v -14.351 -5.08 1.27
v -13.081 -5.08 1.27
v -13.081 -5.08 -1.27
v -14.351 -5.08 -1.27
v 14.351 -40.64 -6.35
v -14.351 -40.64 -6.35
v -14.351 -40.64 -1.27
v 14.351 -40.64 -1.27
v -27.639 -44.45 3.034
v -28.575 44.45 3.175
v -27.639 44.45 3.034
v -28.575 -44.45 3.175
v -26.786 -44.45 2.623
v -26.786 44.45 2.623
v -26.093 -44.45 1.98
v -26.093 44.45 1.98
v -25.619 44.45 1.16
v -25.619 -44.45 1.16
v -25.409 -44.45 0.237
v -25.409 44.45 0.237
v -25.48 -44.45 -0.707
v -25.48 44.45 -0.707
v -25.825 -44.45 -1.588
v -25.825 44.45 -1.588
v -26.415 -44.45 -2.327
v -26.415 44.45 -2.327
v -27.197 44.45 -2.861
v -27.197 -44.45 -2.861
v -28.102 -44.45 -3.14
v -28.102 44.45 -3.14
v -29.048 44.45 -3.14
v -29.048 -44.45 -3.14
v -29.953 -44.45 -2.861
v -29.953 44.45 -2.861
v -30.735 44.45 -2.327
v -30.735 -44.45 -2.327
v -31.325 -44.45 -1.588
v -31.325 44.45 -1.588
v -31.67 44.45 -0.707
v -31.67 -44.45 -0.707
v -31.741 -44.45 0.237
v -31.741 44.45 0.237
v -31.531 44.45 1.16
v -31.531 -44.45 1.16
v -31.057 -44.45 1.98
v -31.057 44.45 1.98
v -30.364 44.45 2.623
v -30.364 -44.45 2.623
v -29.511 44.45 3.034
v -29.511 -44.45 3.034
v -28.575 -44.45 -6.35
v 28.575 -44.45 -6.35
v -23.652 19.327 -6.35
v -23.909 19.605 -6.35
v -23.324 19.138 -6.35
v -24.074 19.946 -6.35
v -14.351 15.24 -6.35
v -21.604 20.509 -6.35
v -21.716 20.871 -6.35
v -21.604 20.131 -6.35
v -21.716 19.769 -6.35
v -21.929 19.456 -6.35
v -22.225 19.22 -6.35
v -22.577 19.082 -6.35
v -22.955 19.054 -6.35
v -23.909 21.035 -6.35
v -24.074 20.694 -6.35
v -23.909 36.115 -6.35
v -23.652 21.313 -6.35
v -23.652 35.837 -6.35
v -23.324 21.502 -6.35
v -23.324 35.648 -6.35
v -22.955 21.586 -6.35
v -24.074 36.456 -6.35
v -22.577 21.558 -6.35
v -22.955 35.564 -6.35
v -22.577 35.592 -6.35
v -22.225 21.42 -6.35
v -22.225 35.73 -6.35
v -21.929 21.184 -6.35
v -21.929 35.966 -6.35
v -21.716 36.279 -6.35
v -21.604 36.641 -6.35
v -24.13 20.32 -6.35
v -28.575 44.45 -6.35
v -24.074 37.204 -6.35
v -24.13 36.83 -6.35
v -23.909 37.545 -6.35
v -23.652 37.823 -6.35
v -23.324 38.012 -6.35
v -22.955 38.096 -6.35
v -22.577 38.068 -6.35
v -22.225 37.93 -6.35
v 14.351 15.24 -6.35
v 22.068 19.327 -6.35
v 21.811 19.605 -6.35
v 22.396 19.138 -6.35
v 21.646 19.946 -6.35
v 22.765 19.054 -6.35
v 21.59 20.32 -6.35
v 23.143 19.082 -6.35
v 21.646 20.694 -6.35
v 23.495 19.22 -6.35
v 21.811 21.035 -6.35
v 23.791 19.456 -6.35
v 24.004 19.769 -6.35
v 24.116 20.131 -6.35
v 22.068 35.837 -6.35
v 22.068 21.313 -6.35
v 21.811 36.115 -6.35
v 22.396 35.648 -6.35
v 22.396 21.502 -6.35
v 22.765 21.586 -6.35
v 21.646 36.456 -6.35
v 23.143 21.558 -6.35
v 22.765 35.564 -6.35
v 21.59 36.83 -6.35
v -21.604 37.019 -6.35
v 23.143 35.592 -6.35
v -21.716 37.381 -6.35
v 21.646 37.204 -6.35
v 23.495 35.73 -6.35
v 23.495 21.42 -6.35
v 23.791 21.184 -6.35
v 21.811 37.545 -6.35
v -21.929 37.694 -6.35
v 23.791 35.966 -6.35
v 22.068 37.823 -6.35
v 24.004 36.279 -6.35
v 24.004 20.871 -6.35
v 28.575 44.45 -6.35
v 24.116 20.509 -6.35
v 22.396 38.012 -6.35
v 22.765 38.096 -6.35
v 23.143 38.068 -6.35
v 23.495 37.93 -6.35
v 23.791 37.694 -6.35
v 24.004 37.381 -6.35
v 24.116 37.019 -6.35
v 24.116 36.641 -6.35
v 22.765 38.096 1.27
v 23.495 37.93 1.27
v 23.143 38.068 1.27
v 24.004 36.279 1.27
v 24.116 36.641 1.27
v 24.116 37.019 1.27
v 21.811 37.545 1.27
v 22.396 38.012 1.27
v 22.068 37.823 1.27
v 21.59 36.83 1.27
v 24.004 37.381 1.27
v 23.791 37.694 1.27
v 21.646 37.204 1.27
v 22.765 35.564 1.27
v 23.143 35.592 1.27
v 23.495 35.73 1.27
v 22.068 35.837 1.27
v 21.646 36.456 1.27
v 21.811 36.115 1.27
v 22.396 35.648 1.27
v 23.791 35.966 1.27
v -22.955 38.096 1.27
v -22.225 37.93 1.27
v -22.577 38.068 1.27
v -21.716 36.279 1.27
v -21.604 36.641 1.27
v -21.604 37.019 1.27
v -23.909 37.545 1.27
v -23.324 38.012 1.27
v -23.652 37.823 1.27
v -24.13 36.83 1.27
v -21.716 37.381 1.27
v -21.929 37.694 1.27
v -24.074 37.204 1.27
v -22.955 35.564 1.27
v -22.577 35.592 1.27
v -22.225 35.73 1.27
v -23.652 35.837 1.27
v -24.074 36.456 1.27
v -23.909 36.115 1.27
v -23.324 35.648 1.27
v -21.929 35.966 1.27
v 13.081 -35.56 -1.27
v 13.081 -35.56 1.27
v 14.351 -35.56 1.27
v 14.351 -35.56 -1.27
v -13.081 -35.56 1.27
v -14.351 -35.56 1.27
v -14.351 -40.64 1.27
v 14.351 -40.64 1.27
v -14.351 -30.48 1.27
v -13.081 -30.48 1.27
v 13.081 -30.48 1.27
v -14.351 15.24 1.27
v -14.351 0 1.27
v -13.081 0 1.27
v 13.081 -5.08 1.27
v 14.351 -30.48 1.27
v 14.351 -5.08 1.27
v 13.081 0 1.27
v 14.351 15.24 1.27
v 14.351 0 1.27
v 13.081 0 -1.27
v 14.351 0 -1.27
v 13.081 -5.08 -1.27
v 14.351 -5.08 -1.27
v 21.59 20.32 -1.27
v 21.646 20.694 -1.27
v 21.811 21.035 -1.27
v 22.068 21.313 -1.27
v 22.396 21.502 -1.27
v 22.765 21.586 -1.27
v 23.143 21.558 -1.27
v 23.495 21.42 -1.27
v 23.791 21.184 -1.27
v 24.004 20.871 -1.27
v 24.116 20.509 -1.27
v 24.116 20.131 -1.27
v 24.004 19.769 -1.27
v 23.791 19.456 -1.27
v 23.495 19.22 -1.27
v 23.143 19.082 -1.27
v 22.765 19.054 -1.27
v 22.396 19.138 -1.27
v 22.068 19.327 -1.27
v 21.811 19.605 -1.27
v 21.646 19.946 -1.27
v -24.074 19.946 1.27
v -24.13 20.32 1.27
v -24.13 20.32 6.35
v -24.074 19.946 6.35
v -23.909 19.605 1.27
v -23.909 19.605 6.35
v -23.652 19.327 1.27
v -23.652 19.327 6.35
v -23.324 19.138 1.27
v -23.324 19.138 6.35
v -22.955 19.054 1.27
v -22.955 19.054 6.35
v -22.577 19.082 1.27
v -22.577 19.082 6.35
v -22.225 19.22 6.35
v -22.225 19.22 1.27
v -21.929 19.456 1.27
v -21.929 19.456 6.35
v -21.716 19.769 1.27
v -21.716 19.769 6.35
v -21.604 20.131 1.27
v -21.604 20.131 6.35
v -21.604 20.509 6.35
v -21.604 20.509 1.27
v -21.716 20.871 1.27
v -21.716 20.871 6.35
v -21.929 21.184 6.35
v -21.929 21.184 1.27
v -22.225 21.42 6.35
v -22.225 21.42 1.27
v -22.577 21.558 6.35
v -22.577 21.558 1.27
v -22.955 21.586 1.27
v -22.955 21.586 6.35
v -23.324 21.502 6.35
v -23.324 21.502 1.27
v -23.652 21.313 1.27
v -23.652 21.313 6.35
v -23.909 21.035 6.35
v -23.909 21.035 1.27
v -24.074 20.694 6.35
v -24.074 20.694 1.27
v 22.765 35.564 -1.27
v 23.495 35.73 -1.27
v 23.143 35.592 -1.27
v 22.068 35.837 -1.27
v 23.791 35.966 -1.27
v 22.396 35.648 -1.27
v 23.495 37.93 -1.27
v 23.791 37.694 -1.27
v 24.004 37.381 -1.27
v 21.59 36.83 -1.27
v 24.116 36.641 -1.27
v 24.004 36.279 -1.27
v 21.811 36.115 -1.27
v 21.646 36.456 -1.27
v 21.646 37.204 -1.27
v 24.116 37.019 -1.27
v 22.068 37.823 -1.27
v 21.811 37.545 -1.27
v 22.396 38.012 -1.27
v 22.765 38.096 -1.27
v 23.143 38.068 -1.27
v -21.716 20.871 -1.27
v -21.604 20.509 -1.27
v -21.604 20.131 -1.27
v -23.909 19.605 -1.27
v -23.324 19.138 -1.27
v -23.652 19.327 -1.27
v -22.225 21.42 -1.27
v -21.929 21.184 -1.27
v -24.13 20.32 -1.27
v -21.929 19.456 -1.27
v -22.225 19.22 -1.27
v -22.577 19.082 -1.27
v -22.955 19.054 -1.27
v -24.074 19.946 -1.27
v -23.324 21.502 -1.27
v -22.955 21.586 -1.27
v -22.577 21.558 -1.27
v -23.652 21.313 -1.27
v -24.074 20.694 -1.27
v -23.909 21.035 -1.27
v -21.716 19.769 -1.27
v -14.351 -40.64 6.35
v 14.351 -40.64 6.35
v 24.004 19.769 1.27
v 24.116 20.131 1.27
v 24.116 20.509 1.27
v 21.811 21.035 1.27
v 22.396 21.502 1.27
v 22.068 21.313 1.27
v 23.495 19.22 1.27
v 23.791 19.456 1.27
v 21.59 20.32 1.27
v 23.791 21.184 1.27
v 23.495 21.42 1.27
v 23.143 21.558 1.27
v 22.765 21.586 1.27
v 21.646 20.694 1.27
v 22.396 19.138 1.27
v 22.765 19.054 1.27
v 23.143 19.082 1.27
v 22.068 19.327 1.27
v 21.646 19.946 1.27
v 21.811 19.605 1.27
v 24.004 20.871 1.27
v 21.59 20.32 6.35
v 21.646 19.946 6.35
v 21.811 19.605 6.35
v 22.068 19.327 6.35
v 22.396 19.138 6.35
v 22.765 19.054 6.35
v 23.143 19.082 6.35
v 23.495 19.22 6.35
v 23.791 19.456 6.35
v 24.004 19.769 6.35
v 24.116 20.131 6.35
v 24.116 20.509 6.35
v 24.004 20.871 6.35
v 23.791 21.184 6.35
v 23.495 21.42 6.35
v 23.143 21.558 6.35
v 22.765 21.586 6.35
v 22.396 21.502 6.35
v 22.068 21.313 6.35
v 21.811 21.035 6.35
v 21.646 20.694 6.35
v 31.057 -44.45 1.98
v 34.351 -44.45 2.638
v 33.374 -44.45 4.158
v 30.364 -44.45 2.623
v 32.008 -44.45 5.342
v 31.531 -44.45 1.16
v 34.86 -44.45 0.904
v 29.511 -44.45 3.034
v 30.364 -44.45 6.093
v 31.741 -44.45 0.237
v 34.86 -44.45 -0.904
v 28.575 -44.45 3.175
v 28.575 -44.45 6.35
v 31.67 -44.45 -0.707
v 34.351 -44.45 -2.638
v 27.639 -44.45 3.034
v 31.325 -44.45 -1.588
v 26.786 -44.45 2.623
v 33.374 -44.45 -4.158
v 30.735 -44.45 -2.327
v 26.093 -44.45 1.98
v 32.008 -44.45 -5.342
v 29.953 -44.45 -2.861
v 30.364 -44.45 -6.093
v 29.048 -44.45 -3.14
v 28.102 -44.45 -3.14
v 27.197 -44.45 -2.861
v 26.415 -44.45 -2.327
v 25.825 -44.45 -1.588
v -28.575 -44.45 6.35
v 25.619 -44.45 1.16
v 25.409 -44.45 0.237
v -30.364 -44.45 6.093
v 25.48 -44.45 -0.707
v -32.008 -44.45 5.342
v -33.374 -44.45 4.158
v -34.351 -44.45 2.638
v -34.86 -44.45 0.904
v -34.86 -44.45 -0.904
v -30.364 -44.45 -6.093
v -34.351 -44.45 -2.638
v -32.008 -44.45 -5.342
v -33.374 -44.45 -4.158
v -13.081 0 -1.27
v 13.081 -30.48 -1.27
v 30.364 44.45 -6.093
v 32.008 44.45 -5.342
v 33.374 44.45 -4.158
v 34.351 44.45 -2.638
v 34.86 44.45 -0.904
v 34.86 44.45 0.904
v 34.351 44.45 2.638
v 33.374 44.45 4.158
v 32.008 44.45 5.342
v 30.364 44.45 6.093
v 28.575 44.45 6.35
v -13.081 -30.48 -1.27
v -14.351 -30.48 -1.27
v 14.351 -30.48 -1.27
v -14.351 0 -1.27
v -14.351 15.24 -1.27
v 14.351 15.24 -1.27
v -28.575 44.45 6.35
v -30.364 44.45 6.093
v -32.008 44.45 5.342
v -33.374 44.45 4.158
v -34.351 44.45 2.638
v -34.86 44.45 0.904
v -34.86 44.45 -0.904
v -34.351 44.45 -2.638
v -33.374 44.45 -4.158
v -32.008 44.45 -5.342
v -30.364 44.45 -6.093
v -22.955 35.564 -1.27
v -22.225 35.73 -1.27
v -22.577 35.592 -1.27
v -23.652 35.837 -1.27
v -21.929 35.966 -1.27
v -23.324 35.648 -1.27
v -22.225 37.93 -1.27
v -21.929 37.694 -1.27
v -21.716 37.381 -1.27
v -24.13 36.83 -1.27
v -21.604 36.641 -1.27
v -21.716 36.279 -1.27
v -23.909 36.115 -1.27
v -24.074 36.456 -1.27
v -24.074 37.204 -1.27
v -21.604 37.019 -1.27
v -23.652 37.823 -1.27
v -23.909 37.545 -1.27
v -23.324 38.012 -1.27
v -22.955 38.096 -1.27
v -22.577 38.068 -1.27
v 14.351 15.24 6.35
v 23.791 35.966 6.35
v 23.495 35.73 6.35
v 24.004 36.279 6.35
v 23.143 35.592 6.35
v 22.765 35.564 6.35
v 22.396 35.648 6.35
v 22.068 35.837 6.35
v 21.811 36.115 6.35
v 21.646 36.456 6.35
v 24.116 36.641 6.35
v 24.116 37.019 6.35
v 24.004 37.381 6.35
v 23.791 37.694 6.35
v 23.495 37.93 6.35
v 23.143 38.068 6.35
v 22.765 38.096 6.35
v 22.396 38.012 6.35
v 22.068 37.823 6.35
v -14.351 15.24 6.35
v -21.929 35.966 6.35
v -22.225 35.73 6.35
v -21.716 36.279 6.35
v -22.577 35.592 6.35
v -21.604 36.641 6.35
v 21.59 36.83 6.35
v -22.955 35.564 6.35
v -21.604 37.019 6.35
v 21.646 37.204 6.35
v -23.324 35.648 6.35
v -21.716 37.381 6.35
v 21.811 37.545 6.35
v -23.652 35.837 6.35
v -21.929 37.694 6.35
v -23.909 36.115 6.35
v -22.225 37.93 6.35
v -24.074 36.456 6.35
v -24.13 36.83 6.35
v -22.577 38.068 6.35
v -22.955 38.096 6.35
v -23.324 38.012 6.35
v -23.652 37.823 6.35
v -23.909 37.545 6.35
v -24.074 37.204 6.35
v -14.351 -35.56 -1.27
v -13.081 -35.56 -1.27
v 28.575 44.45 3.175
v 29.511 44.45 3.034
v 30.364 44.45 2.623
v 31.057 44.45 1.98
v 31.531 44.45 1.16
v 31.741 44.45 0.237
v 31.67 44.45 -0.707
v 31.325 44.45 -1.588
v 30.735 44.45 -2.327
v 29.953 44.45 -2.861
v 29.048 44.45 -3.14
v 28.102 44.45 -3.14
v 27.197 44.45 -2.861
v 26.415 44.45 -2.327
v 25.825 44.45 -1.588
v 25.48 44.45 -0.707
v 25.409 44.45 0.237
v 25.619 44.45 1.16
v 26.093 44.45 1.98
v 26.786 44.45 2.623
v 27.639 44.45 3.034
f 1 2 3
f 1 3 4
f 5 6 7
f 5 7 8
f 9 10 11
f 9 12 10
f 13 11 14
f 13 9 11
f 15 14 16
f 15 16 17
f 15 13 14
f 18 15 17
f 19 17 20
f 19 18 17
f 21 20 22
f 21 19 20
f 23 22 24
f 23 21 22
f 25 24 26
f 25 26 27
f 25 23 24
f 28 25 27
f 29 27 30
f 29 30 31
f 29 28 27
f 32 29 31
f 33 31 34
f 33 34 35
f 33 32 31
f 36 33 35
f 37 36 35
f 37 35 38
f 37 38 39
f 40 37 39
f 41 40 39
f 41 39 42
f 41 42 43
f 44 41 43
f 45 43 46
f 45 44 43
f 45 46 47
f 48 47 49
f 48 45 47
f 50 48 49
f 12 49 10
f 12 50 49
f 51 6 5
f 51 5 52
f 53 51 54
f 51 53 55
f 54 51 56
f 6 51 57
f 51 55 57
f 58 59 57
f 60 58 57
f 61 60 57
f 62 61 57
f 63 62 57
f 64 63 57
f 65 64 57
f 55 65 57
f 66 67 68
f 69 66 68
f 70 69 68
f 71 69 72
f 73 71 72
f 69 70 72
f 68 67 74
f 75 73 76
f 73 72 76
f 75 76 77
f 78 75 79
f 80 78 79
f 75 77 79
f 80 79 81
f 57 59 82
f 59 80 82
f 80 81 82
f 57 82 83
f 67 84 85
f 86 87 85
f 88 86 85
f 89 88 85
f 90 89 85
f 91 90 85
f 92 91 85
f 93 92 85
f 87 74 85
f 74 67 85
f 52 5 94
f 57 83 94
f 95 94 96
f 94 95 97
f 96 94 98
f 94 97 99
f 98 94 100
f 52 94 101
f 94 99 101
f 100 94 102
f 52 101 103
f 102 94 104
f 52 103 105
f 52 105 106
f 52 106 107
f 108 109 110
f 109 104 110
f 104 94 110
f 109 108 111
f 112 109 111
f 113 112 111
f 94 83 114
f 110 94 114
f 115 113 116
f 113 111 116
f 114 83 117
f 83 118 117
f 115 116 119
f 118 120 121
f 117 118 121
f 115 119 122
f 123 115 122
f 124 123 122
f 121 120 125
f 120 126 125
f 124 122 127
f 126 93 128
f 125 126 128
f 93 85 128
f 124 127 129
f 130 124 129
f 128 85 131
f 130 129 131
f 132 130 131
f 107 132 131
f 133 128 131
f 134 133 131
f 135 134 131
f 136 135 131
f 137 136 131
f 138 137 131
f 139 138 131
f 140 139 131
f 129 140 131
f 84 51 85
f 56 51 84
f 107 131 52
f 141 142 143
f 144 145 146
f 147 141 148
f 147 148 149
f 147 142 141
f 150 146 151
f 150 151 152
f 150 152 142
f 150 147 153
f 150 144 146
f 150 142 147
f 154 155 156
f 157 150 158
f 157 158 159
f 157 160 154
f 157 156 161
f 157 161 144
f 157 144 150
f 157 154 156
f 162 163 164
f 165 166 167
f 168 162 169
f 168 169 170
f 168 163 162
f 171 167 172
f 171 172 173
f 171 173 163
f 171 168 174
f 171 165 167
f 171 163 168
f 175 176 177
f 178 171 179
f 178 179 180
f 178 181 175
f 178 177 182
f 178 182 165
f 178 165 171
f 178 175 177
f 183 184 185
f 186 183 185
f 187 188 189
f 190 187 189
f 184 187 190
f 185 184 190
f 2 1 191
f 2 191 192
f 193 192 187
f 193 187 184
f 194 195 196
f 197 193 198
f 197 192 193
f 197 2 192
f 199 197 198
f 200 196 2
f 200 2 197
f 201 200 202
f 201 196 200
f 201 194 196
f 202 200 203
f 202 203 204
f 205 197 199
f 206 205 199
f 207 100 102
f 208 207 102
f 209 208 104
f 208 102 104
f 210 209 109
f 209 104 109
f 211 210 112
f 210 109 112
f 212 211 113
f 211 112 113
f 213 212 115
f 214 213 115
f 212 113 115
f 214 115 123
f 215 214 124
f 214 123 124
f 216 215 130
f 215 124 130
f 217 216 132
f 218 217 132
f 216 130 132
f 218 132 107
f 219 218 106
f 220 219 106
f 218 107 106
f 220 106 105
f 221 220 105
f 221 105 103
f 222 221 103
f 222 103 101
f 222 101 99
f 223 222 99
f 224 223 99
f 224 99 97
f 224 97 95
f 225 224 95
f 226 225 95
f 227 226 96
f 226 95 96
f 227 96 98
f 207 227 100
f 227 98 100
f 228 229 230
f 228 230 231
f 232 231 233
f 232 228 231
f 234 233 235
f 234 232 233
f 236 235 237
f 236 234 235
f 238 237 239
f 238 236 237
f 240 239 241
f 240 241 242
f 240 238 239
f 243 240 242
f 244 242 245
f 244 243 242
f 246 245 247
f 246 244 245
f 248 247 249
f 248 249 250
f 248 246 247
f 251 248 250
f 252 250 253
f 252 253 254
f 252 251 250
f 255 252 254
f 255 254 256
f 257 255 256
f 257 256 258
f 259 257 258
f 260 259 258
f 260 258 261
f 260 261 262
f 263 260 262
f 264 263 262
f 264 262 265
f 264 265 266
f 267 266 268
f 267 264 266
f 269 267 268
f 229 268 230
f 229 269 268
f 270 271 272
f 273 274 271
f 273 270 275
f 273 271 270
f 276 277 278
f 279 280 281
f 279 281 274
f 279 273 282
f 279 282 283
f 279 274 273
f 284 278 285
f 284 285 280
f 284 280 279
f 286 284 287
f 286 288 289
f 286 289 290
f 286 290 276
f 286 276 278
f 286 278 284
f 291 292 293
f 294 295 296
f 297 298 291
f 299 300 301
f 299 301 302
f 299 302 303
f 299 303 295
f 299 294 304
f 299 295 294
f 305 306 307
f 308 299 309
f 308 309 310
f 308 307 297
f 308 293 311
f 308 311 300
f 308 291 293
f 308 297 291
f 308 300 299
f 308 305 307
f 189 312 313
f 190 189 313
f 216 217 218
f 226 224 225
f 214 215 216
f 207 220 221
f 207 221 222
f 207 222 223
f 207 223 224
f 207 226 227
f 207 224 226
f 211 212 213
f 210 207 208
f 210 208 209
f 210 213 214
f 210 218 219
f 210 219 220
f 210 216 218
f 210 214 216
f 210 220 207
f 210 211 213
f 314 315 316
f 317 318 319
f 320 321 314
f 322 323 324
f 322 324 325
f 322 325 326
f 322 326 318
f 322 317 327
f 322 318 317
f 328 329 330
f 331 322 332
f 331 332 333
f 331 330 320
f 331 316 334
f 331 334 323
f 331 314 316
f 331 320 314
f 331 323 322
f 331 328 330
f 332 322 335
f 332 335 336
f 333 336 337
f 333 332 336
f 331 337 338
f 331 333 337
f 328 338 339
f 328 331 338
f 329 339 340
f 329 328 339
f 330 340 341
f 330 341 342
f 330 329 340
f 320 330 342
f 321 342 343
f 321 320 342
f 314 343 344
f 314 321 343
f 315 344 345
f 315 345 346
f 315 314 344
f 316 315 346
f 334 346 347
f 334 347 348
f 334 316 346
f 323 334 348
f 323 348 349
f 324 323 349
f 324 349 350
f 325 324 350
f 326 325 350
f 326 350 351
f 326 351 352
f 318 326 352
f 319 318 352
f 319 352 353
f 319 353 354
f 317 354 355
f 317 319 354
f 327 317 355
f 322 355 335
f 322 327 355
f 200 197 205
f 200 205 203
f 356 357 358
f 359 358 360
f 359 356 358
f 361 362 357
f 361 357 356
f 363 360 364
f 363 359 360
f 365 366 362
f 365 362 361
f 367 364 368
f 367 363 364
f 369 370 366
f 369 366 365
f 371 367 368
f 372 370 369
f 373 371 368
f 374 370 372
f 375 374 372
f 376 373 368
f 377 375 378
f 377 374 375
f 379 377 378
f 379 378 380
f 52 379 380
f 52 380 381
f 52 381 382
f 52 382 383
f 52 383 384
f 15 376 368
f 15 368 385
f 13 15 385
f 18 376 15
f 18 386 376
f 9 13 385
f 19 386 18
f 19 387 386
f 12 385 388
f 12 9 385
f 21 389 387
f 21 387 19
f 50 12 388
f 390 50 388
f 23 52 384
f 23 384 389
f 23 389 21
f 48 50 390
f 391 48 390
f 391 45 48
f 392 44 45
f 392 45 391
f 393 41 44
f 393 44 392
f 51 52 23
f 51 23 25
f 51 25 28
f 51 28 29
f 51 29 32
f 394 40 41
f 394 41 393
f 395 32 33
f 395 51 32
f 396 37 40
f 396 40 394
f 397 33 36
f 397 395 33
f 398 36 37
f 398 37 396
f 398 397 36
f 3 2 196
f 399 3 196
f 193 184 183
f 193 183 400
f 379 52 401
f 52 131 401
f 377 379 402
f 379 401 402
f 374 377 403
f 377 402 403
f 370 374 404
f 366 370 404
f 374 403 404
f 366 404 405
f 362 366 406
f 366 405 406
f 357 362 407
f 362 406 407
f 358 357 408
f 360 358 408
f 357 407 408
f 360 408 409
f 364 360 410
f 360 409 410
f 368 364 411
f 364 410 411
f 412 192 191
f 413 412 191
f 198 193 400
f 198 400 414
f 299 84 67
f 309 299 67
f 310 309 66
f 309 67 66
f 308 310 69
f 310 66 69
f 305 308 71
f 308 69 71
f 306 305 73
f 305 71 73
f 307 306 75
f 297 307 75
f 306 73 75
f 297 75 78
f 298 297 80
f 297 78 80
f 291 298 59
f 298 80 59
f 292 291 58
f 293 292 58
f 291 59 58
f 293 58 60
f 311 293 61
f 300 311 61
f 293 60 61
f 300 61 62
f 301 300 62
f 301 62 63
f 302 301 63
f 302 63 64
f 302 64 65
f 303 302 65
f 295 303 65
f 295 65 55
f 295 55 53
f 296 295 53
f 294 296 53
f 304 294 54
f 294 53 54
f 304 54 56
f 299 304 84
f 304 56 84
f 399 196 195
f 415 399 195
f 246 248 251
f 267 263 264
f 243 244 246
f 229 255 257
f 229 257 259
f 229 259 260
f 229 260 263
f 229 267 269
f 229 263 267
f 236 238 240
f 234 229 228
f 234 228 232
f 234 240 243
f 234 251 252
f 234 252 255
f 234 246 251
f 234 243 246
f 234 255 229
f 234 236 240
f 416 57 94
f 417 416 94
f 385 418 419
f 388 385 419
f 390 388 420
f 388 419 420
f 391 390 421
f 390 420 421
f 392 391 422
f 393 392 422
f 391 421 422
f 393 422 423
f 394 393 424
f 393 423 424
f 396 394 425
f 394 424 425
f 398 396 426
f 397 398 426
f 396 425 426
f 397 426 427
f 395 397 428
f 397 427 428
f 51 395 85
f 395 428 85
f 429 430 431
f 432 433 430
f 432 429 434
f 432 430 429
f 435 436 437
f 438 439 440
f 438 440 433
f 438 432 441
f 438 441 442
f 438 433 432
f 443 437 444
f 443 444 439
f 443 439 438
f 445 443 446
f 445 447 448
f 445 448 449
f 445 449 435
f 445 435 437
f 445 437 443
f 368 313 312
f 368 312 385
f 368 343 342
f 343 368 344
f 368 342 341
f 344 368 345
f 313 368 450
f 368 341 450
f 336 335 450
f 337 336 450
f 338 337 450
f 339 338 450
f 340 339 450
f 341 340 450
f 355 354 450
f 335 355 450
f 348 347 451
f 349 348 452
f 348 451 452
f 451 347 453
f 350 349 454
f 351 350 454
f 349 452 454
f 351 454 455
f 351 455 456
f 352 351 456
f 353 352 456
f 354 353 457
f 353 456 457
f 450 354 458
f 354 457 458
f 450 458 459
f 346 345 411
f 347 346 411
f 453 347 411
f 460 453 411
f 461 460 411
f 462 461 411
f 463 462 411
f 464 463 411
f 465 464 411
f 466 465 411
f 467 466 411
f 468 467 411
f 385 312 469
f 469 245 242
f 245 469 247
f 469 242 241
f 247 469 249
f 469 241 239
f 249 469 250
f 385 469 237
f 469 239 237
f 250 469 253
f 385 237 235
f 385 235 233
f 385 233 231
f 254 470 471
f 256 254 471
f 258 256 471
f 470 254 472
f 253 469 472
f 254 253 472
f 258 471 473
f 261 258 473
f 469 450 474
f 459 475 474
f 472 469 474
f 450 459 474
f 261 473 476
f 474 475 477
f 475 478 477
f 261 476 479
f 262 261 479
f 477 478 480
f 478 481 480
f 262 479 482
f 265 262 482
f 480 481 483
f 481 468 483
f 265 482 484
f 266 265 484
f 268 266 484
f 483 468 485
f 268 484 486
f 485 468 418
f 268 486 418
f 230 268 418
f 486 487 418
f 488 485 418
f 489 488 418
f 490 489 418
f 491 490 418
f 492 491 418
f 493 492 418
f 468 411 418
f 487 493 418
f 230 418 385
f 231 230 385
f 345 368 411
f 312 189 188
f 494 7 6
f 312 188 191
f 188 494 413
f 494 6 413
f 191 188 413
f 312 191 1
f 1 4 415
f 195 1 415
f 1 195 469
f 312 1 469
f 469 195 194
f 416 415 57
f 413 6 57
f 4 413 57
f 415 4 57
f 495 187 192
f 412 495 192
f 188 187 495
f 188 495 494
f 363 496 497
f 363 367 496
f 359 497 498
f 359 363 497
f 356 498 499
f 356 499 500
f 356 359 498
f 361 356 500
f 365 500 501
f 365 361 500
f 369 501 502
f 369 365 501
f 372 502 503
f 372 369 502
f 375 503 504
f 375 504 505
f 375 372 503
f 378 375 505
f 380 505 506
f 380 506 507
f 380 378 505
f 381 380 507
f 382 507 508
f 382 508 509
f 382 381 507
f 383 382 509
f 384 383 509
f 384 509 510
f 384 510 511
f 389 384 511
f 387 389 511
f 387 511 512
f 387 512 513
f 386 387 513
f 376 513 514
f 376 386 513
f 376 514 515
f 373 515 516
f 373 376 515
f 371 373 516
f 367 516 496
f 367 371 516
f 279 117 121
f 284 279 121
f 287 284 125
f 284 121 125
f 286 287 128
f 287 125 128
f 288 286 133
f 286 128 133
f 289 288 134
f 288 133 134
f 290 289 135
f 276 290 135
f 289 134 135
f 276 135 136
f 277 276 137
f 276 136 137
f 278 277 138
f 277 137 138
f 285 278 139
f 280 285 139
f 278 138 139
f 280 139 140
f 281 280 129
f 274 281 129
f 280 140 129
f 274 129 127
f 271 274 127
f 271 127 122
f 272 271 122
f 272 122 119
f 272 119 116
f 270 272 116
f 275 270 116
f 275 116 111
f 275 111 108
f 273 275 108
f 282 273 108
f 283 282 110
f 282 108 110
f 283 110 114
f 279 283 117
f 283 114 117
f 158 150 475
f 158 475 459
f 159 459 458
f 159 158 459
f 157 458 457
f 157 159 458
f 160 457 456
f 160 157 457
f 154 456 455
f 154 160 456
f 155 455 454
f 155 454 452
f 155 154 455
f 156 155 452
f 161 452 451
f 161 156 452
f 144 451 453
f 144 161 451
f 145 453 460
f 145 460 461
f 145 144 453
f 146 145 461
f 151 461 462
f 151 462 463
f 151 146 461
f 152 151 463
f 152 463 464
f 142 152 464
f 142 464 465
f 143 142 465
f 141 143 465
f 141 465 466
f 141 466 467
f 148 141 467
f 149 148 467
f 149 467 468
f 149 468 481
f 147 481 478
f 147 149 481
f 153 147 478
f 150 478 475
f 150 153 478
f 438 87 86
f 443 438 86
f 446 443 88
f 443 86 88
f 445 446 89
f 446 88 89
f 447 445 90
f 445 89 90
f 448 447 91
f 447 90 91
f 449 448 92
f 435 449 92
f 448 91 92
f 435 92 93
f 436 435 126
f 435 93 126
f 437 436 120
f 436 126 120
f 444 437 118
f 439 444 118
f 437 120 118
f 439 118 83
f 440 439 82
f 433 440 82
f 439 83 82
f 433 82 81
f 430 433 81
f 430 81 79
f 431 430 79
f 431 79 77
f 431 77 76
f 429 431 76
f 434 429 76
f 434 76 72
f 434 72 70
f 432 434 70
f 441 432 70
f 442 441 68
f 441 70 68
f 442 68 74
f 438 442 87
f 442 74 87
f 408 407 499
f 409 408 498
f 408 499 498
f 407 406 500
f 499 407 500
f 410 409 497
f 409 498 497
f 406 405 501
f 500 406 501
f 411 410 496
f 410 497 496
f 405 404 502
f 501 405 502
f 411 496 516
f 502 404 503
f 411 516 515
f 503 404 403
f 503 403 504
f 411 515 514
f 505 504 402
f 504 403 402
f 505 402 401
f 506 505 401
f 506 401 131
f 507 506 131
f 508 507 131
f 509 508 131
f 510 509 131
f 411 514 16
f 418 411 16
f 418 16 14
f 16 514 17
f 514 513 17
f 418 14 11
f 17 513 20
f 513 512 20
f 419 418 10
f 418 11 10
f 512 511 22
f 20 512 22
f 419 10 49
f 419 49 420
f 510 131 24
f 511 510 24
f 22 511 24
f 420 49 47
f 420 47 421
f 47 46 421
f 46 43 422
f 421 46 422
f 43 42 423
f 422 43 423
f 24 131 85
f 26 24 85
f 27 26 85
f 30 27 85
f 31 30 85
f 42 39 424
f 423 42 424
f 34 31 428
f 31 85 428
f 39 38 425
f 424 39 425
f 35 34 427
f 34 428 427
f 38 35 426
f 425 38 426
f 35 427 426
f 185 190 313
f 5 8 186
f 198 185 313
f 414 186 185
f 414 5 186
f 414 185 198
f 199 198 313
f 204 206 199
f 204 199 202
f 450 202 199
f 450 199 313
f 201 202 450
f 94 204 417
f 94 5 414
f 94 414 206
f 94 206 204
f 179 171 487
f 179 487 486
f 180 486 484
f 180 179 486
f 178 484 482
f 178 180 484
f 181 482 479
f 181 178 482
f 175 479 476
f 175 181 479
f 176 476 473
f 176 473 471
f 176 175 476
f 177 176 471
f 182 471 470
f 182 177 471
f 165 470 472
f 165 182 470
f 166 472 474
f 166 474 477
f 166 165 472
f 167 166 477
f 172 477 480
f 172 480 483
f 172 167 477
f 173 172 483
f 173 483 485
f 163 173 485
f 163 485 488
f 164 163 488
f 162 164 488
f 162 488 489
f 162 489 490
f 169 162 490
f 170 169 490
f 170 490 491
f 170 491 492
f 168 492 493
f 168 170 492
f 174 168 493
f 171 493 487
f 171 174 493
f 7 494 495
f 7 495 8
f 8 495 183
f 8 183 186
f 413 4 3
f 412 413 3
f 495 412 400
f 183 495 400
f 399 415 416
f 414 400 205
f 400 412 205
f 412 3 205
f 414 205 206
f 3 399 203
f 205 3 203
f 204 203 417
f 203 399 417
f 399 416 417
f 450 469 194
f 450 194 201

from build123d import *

# Parameters (mm, degrees)
SKETCH2_R           = 3.175
BOSS_EXTRUDE1_DEPTH = 44.45
SKETCH5_R           = 1.27
CUT_EXTRUDE1_DEPTH  = 5.08
CUT_EXTRUDE2_START  = -5.08
SKETCH6_R           = 1.27
CUT_EXTRUDE2_DEPTH  = 5.08
SKETCH7_W           = 28.702
SKETCH7_H           = 55.88
CUT_EXTRUDE3_DEPTH  = 5.08
SKETCH8_W           = 1.27
SKETCH8_H           = 5.08
CUT_EXTRUDE4_DEPTH  = 58.040534053


with BuildPart() as part:
    # Sketch2 → Boss-Extrude1 (new, symmetric)
    with BuildSketch(Plane(origin=(0, 0, 0), x_dir=(1, 0, 0), z_dir=(0, 1, 0))):
        with BuildLine():
            Line((-28.575, 6.35), (28.575, 6.35))
            ThreePointArc((28.575, 6.35), (34.925, 0), (28.575, -6.35))
            Line((28.575, -6.35), (-28.575, -6.35))
            ThreePointArc((-28.575, -6.35), (-34.925, 0), (-28.575, 6.35))
        make_face()
        with Locations(Location((28.575, 0, 0), (0, 0, 270))):
            Circle(SKETCH2_R, mode=Mode.SUBTRACT)
        with Locations(Location((-28.575, 0, 0), (0, 0, 270))):
            Circle(SKETCH2_R, mode=Mode.SUBTRACT)
    extrude(amount=BOSS_EXTRUDE1_DEPTH, both=True)

    # Sketch5 → Cut-Extrude1 (cut)
    with BuildSketch(Plane(origin=(0, 0, -6.35), x_dir=(-1, 0, 0), z_dir=(0, 0, -1))):
        with Locations((22.86, 36.83)):
            Circle(SKETCH5_R)
        with Locations((22.86, 20.32)):
            Circle(SKETCH5_R)
        with Locations((-22.86, 36.83)):
            Circle(SKETCH5_R)
        with Locations((-22.86, 20.32)):
            Circle(SKETCH5_R)
    extrude(amount=-CUT_EXTRUDE1_DEPTH, mode=Mode.SUBTRACT)

    # Sketch6 → Cut-Extrude2 (cut)
    with BuildSketch(Plane.XY.offset(6.35).offset(CUT_EXTRUDE2_START)):
        with Locations(Location((22.86, 36.83, 0), (0, 0, 180))):
            Circle(SKETCH6_R)
        with Locations(Location((22.86, 20.32, 0), (0, 0, 180))):
            Circle(SKETCH6_R)
        with Locations(Location((-22.86, 36.83, 0), (0, 0, 180))):
            Circle(SKETCH6_R)
        with Locations(Location((-22.86, 20.32, 0), (0, 0, 180))):
            Circle(SKETCH6_R)
    extrude(amount=CUT_EXTRUDE2_DEPTH, mode=Mode.SUBTRACT)

    # Sketch7 → Cut-Extrude3 (cut)
    with BuildSketch(Plane.XY.offset(6.35)):
        with Locations((0, -12.7)):
            Rectangle(SKETCH7_W, SKETCH7_H)
    cut_extrude3 = extrude(amount=-CUT_EXTRUDE3_DEPTH, mode=Mode.SUBTRACT)

    # Mirror1: Cut-Extrude3 across plane
    add(cut_extrude3.mirror(Plane.XY), mode=Mode.SUBTRACT)

    # Sketch8 → Cut-Extrude4 (cut, through all)
    with BuildSketch(Plane.XY.offset(1.27)):
        with Locations((13.716, -33.02)):
            Rectangle(SKETCH8_W, SKETCH8_H)
        with Locations((13.716, -2.54)):
            Rectangle(SKETCH8_W, SKETCH8_H)
    cut_extrude4 = extrude(amount=-CUT_EXTRUDE4_DEPTH, mode=Mode.SUBTRACT)

    # Mirror2: Cut-Extrude4 across plane
    add(cut_extrude4.mirror(Plane(origin=(0, 0, 0), x_dir=(0, 0, 1), z_dir=(1, 0, 0))), mode=Mode.SUBTRACT)


solid = part.part
